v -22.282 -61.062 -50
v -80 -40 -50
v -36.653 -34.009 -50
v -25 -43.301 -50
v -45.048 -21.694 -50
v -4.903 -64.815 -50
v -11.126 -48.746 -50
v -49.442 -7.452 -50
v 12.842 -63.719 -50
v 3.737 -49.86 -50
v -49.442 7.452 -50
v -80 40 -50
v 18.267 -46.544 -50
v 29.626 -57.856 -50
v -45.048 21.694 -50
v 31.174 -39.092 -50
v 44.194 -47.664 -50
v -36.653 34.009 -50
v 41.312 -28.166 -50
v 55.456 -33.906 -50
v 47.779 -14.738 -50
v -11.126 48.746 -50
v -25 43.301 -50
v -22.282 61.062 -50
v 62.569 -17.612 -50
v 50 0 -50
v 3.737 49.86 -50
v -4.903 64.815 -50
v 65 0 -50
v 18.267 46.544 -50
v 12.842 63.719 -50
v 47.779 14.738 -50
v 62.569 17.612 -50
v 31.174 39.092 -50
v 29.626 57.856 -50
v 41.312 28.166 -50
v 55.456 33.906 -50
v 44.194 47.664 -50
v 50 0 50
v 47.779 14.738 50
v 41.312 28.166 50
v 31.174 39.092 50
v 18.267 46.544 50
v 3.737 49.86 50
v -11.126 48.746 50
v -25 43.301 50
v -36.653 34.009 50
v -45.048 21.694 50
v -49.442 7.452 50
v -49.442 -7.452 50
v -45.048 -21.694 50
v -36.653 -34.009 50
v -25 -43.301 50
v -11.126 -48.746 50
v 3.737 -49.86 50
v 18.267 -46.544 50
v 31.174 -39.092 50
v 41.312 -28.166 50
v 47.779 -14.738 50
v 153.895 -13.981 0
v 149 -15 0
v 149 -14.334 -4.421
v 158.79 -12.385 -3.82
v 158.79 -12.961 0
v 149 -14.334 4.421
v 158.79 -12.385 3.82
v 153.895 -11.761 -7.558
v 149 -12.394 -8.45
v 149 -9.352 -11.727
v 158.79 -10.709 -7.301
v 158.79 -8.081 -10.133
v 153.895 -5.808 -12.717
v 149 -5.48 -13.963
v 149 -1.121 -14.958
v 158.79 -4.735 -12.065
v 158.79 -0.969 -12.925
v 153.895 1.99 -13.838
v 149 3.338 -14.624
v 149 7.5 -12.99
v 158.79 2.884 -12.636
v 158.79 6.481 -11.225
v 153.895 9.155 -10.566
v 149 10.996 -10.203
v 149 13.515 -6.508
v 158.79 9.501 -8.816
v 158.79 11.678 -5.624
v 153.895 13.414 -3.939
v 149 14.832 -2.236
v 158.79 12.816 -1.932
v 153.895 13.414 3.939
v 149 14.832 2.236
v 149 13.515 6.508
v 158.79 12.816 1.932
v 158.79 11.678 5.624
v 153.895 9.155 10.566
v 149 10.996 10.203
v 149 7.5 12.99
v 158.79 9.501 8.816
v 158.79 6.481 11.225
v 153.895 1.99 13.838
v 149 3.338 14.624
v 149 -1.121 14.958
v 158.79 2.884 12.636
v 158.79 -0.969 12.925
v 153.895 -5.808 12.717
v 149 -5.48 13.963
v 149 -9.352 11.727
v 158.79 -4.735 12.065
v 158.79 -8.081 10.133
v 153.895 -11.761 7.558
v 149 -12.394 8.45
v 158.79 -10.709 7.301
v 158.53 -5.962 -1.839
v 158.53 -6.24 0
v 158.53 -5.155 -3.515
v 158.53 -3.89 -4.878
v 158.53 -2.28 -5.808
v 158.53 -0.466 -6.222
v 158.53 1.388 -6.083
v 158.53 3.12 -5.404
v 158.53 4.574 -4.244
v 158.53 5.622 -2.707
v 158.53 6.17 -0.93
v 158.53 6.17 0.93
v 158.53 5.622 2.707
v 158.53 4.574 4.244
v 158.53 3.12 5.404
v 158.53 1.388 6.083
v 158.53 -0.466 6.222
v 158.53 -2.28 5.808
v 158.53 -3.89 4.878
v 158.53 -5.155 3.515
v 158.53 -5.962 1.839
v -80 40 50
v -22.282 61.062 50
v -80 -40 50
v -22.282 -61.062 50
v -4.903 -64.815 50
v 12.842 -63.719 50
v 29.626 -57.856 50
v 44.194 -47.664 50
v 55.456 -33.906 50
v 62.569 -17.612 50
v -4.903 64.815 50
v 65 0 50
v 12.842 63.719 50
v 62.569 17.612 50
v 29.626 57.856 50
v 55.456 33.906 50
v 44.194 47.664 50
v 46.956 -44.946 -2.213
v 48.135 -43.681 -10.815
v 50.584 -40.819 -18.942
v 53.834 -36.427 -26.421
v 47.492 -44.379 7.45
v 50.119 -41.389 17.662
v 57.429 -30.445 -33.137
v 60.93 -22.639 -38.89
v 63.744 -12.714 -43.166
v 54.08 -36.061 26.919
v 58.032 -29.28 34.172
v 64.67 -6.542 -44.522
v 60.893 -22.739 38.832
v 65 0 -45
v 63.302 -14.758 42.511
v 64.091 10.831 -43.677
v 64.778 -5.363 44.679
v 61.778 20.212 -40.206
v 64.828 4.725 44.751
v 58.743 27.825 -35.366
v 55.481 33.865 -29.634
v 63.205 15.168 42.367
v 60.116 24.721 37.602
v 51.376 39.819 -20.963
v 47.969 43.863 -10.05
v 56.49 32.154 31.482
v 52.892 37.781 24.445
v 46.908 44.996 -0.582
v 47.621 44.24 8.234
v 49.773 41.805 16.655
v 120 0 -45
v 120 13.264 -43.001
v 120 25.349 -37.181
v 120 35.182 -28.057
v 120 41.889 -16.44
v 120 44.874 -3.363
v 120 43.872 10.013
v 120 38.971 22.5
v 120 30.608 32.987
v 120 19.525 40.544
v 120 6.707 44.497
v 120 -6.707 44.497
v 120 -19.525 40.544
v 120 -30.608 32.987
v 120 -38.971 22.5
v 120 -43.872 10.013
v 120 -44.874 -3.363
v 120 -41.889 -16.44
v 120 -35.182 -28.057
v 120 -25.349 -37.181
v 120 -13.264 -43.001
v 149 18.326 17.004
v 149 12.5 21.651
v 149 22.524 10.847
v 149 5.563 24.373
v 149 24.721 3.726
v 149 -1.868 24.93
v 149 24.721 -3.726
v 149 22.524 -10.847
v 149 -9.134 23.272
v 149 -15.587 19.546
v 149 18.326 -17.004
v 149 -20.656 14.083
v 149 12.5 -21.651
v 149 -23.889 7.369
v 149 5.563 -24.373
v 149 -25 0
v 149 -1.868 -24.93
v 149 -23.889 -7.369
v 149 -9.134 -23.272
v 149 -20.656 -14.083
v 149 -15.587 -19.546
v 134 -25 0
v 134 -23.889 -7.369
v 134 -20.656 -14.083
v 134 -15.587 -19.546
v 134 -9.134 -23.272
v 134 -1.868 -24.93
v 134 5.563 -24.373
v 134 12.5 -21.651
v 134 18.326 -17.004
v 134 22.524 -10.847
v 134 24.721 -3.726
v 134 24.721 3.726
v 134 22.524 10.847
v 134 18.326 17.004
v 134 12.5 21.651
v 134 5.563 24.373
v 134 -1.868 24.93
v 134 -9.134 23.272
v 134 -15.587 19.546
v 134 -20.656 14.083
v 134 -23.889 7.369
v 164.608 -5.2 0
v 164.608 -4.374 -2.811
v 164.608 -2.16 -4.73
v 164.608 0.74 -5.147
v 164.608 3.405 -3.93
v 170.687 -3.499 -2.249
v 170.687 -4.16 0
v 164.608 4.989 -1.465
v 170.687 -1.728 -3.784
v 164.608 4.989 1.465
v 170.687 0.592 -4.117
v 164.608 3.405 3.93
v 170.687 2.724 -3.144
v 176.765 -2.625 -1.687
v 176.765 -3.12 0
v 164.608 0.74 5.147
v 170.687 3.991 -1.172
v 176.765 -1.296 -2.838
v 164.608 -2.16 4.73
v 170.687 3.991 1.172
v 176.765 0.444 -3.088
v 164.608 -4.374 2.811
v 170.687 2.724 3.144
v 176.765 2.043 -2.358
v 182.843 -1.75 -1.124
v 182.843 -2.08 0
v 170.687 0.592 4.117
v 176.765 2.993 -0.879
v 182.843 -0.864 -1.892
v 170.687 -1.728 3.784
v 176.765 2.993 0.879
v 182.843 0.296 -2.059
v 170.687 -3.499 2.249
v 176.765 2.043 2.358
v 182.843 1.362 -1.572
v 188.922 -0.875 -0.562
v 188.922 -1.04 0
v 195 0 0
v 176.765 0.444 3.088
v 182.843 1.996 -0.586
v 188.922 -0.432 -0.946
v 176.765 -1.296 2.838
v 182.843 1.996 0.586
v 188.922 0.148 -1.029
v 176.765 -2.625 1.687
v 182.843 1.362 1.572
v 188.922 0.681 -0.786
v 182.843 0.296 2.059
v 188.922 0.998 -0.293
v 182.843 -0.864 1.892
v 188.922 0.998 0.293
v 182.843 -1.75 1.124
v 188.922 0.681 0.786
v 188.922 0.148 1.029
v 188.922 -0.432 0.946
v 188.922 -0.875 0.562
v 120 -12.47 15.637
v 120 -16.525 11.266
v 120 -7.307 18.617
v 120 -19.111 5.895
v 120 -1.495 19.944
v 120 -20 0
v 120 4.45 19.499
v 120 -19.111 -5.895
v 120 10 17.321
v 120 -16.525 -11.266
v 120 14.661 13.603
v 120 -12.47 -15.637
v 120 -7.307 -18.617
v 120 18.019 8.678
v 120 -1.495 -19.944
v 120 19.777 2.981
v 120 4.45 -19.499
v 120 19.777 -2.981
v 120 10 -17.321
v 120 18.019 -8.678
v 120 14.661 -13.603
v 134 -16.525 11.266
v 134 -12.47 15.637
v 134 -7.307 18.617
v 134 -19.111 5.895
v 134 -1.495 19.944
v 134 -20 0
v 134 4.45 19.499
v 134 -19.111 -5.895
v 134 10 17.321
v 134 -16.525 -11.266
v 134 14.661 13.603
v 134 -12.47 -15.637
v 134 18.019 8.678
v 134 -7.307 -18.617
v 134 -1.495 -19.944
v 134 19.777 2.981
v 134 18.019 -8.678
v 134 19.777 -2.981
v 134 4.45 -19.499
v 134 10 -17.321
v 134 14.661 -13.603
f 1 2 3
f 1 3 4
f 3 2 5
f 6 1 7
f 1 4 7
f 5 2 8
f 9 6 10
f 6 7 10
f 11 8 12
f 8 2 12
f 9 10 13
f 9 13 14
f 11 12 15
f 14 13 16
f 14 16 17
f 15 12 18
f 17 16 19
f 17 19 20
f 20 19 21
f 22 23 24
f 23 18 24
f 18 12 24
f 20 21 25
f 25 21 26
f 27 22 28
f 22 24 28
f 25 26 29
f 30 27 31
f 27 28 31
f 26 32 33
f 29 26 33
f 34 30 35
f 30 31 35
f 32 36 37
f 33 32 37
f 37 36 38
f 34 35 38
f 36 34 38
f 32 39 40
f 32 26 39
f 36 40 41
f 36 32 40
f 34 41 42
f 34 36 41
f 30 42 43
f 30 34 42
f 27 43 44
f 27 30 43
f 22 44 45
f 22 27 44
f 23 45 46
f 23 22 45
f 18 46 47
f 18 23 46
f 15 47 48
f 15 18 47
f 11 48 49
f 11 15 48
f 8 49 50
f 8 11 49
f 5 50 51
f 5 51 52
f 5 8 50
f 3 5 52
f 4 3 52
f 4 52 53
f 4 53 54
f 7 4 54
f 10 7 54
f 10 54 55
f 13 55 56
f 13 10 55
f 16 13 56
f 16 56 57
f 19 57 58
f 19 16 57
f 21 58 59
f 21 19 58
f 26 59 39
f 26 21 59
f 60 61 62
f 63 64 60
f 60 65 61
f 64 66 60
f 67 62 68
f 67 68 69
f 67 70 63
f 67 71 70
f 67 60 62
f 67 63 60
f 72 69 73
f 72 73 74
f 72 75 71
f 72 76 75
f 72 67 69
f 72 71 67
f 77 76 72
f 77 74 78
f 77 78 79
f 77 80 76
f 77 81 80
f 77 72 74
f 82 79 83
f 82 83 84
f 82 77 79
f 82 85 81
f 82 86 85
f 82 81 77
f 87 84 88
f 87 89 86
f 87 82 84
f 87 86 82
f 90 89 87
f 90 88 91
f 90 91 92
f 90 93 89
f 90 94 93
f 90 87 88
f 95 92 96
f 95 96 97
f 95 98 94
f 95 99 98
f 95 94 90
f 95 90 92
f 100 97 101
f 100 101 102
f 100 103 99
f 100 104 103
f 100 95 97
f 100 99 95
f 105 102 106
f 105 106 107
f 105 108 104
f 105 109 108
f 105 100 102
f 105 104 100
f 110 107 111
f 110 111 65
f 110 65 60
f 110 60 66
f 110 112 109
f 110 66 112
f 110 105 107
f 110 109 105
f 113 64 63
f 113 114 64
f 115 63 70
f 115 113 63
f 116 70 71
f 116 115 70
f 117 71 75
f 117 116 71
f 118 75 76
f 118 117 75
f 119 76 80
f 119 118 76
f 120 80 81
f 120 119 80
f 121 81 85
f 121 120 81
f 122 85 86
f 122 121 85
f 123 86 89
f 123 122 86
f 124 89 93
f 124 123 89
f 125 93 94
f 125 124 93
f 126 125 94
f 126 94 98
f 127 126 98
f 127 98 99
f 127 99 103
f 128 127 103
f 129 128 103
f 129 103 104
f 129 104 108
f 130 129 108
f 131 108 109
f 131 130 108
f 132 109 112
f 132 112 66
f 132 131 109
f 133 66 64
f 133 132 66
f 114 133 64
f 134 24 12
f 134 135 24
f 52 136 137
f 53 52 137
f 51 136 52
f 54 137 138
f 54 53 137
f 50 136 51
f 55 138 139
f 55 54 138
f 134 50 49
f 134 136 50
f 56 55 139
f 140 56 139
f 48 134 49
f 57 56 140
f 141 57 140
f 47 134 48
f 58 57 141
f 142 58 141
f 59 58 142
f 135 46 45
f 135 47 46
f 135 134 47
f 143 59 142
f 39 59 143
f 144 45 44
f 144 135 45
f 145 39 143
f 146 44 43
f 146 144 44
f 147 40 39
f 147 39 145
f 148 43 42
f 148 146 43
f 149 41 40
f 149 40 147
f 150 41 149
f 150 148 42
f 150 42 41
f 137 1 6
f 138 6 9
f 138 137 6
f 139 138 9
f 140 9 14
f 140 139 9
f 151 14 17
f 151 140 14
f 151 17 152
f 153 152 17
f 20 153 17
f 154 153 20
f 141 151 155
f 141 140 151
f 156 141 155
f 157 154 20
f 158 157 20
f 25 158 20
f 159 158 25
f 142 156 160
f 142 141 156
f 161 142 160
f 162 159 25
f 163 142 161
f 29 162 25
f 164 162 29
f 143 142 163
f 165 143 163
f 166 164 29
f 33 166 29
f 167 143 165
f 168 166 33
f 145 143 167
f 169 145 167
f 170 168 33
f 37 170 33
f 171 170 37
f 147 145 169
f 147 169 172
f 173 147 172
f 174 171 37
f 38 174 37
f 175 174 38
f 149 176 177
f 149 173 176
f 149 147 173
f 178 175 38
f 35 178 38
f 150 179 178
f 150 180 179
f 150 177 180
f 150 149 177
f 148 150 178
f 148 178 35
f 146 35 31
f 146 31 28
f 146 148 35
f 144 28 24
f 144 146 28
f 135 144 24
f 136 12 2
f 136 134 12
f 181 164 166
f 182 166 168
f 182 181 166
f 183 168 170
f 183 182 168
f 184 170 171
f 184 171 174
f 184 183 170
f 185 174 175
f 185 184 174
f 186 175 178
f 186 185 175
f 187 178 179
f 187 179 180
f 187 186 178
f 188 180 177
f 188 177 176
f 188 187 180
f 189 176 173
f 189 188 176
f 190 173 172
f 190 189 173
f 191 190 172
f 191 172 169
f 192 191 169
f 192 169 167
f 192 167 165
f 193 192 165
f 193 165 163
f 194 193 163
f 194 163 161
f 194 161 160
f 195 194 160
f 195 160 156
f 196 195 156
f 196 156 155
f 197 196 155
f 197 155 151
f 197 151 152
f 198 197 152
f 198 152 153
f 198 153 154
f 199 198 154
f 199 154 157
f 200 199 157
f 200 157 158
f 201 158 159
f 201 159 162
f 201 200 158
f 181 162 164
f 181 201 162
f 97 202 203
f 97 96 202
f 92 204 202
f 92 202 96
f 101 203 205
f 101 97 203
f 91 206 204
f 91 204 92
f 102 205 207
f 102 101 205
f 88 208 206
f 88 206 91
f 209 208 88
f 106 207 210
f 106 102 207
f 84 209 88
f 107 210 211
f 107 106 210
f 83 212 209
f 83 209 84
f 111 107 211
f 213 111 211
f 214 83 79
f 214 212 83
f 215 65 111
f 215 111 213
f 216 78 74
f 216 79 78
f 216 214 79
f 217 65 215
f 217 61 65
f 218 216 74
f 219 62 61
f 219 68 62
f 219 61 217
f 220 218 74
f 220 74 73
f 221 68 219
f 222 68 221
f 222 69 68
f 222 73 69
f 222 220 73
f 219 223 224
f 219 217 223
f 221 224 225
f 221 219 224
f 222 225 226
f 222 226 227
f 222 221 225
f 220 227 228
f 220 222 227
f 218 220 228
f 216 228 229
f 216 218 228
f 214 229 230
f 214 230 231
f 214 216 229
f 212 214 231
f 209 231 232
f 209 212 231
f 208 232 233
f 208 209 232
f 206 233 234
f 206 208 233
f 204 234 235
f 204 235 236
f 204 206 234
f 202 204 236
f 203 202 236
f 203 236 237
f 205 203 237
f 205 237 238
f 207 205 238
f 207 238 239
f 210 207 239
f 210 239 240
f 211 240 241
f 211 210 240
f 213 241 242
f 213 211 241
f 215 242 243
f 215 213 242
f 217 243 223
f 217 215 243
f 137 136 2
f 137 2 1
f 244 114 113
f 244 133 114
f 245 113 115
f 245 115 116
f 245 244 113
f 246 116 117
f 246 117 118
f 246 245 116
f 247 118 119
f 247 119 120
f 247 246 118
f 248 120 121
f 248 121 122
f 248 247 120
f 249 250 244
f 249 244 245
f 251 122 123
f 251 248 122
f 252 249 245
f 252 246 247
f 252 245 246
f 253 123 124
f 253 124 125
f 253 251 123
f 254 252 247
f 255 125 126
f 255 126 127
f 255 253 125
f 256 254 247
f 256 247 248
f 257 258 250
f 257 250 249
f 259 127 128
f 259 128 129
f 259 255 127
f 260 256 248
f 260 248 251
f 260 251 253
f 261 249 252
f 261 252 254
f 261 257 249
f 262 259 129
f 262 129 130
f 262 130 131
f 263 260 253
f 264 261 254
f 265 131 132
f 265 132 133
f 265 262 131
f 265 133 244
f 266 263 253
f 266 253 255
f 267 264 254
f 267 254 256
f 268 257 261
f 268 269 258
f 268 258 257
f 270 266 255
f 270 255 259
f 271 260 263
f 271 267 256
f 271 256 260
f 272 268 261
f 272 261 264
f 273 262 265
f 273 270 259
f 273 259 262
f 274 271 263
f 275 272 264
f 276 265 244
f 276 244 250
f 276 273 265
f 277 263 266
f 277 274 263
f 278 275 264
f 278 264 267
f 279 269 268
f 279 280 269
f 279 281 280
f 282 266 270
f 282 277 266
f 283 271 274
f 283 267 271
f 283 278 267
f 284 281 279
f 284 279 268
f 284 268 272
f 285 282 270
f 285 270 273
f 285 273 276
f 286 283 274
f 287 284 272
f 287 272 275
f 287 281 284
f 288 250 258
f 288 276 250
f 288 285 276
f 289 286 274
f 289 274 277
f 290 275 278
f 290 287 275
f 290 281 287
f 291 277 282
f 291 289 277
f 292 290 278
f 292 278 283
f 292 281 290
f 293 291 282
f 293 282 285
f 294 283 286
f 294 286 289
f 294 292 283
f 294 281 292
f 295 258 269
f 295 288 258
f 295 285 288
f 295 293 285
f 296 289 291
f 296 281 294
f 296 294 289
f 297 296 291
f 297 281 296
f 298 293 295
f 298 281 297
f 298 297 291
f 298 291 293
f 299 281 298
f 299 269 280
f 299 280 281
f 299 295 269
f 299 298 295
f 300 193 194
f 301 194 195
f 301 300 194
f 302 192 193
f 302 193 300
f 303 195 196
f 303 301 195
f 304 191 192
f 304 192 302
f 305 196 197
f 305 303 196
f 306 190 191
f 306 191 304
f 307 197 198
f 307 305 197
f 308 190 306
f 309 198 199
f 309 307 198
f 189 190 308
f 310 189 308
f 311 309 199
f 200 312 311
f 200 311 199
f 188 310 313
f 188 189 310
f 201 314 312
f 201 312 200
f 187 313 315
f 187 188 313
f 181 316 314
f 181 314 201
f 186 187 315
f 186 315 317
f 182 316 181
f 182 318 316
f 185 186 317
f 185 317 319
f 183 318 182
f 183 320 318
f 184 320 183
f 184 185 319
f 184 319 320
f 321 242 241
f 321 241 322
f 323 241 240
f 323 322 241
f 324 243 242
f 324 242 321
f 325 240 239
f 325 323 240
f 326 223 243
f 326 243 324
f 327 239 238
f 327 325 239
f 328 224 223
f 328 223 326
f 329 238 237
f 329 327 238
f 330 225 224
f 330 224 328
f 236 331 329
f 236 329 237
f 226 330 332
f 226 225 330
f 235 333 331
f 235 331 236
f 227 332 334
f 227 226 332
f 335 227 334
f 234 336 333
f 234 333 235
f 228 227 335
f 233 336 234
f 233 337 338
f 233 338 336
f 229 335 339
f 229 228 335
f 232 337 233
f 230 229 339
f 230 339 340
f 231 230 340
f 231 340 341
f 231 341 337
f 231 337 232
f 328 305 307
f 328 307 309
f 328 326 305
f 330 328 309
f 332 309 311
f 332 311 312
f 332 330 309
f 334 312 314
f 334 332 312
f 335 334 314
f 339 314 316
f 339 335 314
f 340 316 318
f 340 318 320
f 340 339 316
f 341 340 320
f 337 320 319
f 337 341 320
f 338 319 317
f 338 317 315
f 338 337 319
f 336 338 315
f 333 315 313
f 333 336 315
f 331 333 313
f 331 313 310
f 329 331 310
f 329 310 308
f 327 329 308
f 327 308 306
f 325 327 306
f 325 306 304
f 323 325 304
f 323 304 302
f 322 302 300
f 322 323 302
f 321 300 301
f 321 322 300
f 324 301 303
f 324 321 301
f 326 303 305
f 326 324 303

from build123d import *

# Parameters (mm, degrees)
SKETCH1_R           = 50
BOSS_EXTRUDE1_DEPTH = 50
BOSS_EXTRUDE2_REACH = 202
SKETCH2_R           = 45


with BuildPart() as part:
    # Sketch1 → Boss-Extrude1 (new body, symmetric)
    with BuildSketch(Plane.XY):
        with BuildLine():
            Line((-80, 40), (-80, -40))
            Line((-80, -40), (-22.281665693, -61.061668614))
            ThreePointArc((-22.281665693, -61.061668614), (65, 0), (-22.281665693, 61.061668614))
            Line((-22.281665693, 61.061668614), (-80, 40))
        make_face()
        Circle(SKETCH1_R, mode=Mode.SUBTRACT)
    extrude(amount=BOSS_EXTRUDE1_DEPTH, both=True)

    # Sketch2 → Boss-Extrude2 (add, up to next)
    with BuildSketch(Plane(origin=(120, 0, 0), x_dir=(0, 0, -1), z_dir=(1, 0, 0)), mode=Mode.PRIVATE) as boss_extrude2_sk1:
        Circle(SKETCH2_R)
    boss_extrude2_tool1 = extrude(boss_extrude2_sk1.sketch, amount=-BOSS_EXTRUDE2_REACH, mode=Mode.PRIVATE) - part.part
    add(boss_extrude2_tool1.solids().sort_by_distance((120, 0, 0))[0])

    # Sketch4 → Revolve1 (revolve)
    with BuildSketch(Plane.XY):
        Polygon((120, -20), (134, -20), (134, -25), (149, -25), (149, -15), (158.789932038, -12.961071192), (158.529899955, -6.239535459), (195, 0), (120, 0), align=None)
    revolve(axis=Axis((120, 0, 0), (1, 0, 0)))


solid = part.part
